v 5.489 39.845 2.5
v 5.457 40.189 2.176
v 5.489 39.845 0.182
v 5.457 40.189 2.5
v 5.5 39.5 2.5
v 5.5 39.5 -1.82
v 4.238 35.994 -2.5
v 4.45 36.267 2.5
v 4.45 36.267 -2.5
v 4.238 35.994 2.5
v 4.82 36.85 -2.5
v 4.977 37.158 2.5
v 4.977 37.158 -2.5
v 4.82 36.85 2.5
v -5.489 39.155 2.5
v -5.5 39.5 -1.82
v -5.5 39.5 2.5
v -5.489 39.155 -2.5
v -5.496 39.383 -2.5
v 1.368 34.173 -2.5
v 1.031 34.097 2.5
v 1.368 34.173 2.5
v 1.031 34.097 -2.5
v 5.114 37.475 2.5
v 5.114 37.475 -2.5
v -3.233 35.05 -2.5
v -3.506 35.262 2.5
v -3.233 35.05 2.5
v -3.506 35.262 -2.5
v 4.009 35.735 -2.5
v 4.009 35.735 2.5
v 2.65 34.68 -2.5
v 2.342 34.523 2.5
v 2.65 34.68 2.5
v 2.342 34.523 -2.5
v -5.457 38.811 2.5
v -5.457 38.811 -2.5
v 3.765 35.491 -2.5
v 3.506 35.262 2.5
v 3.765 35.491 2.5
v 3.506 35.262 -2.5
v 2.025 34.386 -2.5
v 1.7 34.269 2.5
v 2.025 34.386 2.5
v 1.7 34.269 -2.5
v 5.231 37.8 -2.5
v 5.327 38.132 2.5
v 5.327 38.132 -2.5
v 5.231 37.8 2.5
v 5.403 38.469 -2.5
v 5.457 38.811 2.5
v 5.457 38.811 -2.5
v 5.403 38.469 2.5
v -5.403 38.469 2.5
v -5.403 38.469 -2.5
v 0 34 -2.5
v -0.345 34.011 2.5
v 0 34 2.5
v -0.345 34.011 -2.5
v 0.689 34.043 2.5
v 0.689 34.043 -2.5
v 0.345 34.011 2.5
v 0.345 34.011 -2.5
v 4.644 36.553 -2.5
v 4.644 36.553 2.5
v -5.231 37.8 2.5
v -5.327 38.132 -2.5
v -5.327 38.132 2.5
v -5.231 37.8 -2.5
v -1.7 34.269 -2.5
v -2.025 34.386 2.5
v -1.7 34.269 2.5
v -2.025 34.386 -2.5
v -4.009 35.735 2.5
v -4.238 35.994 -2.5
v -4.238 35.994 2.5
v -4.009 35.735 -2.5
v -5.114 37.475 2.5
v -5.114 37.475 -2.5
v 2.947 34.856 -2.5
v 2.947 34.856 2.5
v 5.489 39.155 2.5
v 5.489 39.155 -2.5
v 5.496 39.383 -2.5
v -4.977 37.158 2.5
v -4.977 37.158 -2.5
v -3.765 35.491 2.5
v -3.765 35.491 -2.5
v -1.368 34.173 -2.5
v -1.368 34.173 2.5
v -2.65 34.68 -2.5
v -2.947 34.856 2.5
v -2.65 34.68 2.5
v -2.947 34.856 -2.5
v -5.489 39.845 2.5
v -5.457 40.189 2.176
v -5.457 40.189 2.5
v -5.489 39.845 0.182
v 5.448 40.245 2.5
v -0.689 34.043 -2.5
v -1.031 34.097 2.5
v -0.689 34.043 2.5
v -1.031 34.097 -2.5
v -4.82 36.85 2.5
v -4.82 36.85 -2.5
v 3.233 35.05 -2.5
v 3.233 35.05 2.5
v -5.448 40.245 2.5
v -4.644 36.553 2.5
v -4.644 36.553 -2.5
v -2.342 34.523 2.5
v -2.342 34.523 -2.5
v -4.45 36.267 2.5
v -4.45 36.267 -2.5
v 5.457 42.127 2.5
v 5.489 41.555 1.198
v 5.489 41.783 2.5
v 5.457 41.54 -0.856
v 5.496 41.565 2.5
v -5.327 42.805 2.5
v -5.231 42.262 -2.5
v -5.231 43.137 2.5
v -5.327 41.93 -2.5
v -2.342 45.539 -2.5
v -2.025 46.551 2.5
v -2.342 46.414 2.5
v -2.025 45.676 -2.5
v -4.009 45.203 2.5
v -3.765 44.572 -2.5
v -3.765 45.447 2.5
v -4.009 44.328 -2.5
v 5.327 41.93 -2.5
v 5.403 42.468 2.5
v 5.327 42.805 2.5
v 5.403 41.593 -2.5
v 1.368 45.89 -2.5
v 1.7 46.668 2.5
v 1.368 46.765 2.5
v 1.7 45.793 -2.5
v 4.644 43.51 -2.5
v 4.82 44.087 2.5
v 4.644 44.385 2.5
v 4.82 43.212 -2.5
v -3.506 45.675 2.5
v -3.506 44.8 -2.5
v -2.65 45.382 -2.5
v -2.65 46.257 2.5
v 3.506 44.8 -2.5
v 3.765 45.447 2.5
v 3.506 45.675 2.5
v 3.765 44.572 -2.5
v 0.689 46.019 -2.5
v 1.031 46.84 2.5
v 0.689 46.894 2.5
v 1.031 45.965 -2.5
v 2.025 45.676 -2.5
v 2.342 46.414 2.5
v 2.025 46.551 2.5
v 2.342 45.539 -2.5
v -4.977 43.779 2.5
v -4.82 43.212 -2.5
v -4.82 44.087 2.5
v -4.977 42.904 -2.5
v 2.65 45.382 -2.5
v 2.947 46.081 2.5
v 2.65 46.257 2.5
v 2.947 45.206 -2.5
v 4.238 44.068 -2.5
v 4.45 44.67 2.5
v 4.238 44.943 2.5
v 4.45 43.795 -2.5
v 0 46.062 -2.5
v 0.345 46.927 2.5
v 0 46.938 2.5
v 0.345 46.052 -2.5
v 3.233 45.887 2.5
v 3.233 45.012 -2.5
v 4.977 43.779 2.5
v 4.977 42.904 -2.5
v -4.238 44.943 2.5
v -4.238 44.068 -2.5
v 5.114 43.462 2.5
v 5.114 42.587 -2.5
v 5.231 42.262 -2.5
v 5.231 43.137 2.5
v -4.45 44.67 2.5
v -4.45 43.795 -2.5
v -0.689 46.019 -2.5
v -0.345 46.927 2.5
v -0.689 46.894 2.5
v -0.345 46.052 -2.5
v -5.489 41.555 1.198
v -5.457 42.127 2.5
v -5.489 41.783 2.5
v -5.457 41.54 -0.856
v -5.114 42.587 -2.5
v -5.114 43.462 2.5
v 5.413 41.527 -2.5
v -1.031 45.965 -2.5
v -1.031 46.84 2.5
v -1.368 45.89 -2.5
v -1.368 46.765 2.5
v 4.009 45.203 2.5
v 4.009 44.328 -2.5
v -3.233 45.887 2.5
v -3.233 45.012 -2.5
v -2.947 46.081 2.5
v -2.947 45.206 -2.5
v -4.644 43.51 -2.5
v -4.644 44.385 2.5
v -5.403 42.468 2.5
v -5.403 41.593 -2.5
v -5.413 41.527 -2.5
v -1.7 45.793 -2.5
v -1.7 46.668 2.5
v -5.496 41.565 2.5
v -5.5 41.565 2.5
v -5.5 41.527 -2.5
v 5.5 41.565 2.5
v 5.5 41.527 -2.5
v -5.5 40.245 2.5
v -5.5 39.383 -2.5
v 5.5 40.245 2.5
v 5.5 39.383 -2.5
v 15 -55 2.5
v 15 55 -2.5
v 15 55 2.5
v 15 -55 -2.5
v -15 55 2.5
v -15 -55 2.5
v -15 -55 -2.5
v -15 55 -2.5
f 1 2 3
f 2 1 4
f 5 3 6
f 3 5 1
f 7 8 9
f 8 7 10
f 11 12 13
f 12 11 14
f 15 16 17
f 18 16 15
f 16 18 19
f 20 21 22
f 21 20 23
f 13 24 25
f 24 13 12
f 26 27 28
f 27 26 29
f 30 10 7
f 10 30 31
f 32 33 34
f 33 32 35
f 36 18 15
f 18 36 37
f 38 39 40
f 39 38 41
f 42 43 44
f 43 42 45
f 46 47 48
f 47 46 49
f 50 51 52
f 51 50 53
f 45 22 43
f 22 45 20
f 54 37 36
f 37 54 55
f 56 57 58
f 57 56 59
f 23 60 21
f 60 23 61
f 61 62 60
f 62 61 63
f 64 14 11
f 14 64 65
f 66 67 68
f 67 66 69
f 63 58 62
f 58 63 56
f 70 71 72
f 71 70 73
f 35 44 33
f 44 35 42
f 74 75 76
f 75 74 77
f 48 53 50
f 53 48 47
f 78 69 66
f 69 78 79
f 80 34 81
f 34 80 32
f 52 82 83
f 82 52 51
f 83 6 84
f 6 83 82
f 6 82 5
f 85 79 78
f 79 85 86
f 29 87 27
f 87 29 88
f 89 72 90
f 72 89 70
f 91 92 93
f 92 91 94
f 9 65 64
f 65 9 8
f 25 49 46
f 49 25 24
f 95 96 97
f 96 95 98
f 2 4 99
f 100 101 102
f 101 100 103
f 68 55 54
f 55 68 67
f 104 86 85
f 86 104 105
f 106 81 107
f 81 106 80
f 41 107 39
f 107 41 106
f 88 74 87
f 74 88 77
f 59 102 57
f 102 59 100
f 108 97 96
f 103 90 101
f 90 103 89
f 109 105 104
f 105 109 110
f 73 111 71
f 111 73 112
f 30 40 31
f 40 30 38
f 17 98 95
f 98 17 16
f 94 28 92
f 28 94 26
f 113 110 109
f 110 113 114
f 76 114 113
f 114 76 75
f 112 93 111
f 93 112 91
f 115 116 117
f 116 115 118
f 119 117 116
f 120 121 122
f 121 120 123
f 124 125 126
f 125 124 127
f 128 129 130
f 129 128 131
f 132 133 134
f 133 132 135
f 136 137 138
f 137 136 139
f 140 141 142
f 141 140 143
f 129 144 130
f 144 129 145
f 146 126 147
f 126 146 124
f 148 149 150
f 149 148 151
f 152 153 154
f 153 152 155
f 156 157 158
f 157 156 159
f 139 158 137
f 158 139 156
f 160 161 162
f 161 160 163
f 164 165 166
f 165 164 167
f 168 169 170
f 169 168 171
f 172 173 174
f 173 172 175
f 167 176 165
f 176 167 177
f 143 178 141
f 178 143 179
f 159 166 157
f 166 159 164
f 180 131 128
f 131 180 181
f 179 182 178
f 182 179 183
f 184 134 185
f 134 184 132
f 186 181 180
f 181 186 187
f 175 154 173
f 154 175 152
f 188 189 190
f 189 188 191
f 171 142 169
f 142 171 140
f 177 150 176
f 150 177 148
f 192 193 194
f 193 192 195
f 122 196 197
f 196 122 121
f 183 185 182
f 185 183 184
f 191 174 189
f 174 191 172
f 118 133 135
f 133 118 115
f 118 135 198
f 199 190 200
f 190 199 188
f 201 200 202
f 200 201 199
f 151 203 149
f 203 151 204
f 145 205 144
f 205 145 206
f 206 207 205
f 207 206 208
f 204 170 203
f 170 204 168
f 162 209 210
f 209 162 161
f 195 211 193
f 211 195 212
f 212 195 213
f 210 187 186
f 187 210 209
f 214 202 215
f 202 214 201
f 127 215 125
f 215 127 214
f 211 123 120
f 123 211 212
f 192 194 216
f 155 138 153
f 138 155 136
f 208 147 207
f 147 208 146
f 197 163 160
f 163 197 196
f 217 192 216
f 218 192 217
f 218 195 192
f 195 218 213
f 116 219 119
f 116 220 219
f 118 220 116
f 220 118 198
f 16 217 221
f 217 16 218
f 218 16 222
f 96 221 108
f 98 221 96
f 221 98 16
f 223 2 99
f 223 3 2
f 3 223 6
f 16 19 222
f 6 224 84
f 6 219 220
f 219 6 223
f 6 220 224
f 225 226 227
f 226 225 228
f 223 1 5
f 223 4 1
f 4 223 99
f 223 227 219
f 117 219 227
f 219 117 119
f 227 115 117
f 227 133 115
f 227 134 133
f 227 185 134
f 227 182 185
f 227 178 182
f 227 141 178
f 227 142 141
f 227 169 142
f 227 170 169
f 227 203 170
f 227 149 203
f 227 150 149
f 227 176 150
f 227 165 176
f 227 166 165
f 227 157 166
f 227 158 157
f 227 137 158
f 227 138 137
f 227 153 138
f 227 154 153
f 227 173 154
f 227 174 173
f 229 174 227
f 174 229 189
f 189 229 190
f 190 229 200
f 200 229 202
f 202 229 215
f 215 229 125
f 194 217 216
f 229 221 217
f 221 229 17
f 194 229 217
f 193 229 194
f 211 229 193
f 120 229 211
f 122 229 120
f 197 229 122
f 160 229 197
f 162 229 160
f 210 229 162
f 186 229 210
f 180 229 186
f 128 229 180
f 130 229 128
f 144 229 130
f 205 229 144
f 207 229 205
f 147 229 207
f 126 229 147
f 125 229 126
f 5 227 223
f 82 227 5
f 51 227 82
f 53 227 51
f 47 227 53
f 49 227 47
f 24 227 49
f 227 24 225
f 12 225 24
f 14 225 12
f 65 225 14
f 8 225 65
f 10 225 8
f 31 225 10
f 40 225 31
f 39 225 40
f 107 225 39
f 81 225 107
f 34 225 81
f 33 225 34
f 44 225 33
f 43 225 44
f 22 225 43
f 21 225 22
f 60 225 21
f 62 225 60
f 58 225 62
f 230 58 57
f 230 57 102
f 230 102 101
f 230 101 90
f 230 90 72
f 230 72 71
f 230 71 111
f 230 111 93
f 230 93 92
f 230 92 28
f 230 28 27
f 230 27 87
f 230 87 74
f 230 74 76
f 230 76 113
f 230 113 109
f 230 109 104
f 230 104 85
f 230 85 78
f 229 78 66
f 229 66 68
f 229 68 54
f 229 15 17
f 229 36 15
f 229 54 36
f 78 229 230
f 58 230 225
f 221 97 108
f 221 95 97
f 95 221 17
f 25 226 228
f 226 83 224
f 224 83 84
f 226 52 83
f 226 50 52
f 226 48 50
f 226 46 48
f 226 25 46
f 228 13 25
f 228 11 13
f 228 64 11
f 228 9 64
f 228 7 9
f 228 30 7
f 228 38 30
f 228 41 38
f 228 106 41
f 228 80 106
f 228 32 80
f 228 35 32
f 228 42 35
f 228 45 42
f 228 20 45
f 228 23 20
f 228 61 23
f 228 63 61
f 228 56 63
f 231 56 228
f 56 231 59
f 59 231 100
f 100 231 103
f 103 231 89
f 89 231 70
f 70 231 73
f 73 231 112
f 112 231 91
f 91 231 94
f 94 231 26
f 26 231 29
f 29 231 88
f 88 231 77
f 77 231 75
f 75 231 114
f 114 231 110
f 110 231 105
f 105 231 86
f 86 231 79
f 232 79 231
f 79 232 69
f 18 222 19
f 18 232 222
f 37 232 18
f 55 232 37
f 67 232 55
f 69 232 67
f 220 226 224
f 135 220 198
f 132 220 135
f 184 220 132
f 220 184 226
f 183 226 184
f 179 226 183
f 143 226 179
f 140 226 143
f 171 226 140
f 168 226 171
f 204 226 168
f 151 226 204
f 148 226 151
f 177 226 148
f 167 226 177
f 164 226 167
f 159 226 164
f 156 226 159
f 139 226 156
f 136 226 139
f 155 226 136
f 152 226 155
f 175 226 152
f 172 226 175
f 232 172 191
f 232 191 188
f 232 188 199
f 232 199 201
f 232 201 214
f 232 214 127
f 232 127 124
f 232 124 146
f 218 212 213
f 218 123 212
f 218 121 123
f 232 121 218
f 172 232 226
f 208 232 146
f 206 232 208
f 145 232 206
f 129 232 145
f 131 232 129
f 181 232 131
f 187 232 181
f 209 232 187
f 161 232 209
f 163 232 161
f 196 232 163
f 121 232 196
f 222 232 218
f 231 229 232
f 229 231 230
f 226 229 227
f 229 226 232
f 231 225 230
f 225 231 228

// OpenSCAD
HEIGHT = 80+30;

module separator_block() {
    cube([30,HEIGHT,5], center = true);
}

module hole() {
    DIAMETER = 11;
    translate([0,HEIGHT/2 - DIAMETER/2 - 10,40])
    cylinder(d = DIAMETER, h = 100, center = true, $fn = 100);
    
    multmatrix([[1,0,0,0],
                [0,1,0.175,1.5],
                [0,0,1,0]])
    translate([0,HEIGHT/2 + DIAMETER/2 - (HEIGHT - 30 - 45),40])
    cylinder(d = DIAMETER, h = 100, center = true, $fn = 100);
    
    //translate([0,HEIGHT/2 + 9/2 - (HEIGHT - 30 - 45),40])
    //cylinder(d = 9, h = 100, center = true, $fn = 100);
    
    multmatrix([[1,0,0,0],
                [0,1,0.09,31.5],
                [0,0,1,-22]])
    translate([0,0,25])
    scale([1,1,7])
    rotate([0,-90,0])
    cylinder(d = 25, h = DIAMETER, center = true, $fn = 3);
}


i = 8;
difference() {
    translate([0,0,0]) separator_block();
    translate([0,0,-10*i]) hole();
}
